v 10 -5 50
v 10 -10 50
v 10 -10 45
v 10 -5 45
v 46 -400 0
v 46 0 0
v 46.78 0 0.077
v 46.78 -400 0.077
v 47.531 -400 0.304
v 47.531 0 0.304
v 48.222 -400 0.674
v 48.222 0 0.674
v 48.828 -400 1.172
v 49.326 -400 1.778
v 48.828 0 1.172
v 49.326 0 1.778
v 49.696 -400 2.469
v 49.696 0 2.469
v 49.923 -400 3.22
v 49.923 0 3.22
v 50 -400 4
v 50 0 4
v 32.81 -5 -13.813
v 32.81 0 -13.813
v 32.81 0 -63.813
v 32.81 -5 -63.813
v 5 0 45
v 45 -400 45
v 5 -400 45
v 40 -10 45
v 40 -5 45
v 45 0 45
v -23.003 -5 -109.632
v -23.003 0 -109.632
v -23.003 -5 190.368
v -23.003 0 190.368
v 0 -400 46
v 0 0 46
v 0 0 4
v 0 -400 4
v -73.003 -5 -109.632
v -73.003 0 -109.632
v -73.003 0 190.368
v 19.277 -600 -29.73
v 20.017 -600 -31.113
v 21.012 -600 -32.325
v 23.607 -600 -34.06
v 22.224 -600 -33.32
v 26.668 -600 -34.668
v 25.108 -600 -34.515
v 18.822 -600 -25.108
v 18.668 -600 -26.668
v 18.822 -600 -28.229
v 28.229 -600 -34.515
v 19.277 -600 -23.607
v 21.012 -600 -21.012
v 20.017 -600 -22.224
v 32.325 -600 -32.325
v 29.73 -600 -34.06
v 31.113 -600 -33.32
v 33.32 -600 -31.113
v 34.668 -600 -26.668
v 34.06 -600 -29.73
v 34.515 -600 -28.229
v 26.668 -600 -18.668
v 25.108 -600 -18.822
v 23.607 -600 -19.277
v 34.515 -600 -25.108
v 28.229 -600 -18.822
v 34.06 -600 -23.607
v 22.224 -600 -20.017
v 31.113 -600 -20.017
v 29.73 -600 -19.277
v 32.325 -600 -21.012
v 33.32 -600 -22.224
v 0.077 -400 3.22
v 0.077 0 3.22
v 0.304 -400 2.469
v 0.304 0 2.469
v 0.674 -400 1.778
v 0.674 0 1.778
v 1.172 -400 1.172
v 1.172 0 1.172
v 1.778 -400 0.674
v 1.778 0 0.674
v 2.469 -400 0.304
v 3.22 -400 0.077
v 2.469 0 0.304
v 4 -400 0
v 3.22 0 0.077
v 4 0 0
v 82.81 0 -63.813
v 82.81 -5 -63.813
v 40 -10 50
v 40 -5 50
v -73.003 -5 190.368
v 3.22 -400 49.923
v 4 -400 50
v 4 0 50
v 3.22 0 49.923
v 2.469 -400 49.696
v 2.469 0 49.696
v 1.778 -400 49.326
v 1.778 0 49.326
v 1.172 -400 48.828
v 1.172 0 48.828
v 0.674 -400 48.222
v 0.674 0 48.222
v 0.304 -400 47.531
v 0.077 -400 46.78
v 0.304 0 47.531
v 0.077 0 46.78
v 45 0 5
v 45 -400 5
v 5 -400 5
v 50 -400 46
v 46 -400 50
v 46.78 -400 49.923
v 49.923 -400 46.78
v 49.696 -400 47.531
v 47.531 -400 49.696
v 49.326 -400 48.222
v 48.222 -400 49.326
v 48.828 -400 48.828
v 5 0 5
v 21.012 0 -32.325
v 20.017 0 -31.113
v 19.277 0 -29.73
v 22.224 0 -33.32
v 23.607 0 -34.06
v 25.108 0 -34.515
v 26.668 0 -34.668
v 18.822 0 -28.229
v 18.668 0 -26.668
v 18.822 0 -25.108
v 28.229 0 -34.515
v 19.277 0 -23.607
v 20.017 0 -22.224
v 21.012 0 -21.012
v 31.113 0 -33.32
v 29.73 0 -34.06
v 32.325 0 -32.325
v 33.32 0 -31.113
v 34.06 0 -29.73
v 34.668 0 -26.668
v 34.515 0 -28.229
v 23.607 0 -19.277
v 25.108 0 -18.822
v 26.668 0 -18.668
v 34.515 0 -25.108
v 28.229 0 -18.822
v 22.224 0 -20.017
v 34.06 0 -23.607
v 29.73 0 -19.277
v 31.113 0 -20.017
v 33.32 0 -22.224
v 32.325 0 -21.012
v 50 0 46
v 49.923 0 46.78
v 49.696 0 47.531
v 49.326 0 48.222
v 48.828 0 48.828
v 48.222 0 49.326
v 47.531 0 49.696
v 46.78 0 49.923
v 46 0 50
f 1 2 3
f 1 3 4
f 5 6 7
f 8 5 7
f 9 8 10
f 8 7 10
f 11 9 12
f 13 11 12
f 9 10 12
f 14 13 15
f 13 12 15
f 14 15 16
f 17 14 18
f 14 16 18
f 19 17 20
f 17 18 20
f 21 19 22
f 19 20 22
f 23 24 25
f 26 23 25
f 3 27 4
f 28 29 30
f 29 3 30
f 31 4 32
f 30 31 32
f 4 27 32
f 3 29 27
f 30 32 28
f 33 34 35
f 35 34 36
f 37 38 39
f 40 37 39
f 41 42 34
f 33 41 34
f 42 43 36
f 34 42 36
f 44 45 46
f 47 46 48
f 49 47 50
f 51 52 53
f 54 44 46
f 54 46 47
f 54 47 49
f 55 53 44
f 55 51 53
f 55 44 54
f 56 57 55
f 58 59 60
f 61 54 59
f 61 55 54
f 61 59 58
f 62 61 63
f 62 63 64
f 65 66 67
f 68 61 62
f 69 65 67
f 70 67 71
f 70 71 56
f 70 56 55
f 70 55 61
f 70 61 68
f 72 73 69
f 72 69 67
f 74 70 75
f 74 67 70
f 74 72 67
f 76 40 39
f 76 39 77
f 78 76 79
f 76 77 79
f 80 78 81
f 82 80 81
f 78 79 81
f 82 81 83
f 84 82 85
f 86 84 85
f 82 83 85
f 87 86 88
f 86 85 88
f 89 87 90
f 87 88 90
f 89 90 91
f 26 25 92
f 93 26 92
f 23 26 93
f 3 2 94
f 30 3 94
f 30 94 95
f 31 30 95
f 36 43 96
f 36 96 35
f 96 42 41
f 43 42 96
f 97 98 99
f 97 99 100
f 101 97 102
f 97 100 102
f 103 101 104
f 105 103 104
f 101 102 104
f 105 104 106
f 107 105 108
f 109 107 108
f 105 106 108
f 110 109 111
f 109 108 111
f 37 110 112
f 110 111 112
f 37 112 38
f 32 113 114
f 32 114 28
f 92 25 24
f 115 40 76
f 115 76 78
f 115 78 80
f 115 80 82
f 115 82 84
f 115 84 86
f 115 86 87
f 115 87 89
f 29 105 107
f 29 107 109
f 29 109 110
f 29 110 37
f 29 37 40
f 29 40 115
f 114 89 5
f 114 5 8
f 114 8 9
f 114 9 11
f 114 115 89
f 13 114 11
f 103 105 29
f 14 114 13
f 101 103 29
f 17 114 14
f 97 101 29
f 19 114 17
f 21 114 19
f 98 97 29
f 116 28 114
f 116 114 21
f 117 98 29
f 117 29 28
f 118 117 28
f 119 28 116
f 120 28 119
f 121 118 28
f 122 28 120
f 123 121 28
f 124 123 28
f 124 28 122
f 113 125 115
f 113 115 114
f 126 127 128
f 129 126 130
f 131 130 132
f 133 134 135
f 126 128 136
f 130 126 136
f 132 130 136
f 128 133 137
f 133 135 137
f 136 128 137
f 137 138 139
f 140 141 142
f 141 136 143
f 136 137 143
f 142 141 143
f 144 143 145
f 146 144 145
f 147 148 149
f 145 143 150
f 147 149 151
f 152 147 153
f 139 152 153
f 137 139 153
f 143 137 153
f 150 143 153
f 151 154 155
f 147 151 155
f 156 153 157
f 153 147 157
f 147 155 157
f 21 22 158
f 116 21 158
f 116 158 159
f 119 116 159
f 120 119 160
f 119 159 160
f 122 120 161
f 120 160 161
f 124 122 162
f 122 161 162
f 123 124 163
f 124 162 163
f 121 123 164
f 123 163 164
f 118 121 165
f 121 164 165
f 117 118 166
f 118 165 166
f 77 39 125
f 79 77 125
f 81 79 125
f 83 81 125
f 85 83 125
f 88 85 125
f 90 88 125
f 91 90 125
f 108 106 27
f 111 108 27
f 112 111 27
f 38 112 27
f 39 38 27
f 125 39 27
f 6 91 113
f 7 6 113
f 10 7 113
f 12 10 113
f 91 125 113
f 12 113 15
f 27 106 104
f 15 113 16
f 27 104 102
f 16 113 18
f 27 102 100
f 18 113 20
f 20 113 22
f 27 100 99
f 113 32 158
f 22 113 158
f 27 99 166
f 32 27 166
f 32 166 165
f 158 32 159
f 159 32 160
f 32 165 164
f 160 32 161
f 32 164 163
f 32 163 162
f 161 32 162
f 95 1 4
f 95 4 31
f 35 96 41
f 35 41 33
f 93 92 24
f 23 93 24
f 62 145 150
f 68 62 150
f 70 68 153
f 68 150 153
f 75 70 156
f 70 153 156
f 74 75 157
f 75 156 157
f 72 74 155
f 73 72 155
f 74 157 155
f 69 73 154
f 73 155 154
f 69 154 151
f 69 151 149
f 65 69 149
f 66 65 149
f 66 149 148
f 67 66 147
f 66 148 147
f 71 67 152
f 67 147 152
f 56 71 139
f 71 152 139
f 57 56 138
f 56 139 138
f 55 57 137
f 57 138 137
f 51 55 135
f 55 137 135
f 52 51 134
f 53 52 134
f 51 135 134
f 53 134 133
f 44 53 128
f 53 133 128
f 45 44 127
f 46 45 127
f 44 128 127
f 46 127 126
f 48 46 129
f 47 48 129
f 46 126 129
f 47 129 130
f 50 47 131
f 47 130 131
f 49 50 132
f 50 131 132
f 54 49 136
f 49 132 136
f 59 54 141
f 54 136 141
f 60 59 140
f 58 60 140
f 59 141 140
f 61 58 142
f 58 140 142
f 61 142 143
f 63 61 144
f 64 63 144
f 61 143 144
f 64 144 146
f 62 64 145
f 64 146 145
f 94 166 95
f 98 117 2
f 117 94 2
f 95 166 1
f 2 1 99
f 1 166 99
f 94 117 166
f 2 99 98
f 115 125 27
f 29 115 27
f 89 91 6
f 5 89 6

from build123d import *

# Parameters (mm, degrees)
F0_W     = 40
F0_H     = 40
F1_DEPTH = 400
F2_W     = 50
F2_H     = 300
F3_DEPTH = 5
F4_R     = 8
F5_DEPTH = 600
F7_DEPTH = 5
F8_W     = 30
F8_H     = 5
F9_DEPTH = 5


with BuildPart() as f1:
    # F0 (on Front) → F1 (new body)
    with BuildSketch(Plane.XZ):
        with BuildLine():
            ThreePointArc((0, 4), (1.171573, 1.171573), (4, 0))
            Line((4, 0), (46, 0))
            ThreePointArc((46, 0), (48.828427, 1.171573), (50, 4))
            Line((50, 4), (50, 46))
            ThreePointArc((50, 46), (48.828427, 48.828427), (46, 50))
            Line((46, 50), (4, 50))
            ThreePointArc((4, 50), (1.171573, 48.828427), (0, 46))
            Line((0, 46), (0, 4))
        make_face()
        with Locations((25, 25)):
            Rectangle(F0_W, F0_H, mode=Mode.SUBTRACT)
    extrude(amount=F1_DEPTH)

    # F8 (on face) → F9 (cut, through all)
    with BuildSketch(Plane.XY.offset(50)):
        with Locations((25, -7.5)):
            Rectangle(F8_W, F8_H)
    extrude(amount=-F9_DEPTH, mode=Mode.SUBTRACT)


with BuildPart() as f3:
    # F2 (on Front) → F3 (new body)
    with BuildSketch(Plane.XZ):
        with Locations((-48.003251, 40.367897)):
            Rectangle(F2_W, F2_H)
    extrude(amount=F3_DEPTH)


with BuildPart() as f5:
    # F4 (on Front) → F5 (new body)
    with BuildSketch(Plane.XZ):
        with Locations((26.668478, -26.66847)):
            Circle(F4_R)
    extrude(amount=F5_DEPTH)


with BuildPart() as f7:
    # F6 (on Front) → F7 (new body)
    with BuildSketch(Plane.XZ):
        Polygon((32.810374, -13.812944), (32.810374, -63.812944), (82.810374, -63.812944), align=None)
    extrude(amount=F7_DEPTH)


solid = Compound([f1.part, f3.part, f5.part, f7.part])
